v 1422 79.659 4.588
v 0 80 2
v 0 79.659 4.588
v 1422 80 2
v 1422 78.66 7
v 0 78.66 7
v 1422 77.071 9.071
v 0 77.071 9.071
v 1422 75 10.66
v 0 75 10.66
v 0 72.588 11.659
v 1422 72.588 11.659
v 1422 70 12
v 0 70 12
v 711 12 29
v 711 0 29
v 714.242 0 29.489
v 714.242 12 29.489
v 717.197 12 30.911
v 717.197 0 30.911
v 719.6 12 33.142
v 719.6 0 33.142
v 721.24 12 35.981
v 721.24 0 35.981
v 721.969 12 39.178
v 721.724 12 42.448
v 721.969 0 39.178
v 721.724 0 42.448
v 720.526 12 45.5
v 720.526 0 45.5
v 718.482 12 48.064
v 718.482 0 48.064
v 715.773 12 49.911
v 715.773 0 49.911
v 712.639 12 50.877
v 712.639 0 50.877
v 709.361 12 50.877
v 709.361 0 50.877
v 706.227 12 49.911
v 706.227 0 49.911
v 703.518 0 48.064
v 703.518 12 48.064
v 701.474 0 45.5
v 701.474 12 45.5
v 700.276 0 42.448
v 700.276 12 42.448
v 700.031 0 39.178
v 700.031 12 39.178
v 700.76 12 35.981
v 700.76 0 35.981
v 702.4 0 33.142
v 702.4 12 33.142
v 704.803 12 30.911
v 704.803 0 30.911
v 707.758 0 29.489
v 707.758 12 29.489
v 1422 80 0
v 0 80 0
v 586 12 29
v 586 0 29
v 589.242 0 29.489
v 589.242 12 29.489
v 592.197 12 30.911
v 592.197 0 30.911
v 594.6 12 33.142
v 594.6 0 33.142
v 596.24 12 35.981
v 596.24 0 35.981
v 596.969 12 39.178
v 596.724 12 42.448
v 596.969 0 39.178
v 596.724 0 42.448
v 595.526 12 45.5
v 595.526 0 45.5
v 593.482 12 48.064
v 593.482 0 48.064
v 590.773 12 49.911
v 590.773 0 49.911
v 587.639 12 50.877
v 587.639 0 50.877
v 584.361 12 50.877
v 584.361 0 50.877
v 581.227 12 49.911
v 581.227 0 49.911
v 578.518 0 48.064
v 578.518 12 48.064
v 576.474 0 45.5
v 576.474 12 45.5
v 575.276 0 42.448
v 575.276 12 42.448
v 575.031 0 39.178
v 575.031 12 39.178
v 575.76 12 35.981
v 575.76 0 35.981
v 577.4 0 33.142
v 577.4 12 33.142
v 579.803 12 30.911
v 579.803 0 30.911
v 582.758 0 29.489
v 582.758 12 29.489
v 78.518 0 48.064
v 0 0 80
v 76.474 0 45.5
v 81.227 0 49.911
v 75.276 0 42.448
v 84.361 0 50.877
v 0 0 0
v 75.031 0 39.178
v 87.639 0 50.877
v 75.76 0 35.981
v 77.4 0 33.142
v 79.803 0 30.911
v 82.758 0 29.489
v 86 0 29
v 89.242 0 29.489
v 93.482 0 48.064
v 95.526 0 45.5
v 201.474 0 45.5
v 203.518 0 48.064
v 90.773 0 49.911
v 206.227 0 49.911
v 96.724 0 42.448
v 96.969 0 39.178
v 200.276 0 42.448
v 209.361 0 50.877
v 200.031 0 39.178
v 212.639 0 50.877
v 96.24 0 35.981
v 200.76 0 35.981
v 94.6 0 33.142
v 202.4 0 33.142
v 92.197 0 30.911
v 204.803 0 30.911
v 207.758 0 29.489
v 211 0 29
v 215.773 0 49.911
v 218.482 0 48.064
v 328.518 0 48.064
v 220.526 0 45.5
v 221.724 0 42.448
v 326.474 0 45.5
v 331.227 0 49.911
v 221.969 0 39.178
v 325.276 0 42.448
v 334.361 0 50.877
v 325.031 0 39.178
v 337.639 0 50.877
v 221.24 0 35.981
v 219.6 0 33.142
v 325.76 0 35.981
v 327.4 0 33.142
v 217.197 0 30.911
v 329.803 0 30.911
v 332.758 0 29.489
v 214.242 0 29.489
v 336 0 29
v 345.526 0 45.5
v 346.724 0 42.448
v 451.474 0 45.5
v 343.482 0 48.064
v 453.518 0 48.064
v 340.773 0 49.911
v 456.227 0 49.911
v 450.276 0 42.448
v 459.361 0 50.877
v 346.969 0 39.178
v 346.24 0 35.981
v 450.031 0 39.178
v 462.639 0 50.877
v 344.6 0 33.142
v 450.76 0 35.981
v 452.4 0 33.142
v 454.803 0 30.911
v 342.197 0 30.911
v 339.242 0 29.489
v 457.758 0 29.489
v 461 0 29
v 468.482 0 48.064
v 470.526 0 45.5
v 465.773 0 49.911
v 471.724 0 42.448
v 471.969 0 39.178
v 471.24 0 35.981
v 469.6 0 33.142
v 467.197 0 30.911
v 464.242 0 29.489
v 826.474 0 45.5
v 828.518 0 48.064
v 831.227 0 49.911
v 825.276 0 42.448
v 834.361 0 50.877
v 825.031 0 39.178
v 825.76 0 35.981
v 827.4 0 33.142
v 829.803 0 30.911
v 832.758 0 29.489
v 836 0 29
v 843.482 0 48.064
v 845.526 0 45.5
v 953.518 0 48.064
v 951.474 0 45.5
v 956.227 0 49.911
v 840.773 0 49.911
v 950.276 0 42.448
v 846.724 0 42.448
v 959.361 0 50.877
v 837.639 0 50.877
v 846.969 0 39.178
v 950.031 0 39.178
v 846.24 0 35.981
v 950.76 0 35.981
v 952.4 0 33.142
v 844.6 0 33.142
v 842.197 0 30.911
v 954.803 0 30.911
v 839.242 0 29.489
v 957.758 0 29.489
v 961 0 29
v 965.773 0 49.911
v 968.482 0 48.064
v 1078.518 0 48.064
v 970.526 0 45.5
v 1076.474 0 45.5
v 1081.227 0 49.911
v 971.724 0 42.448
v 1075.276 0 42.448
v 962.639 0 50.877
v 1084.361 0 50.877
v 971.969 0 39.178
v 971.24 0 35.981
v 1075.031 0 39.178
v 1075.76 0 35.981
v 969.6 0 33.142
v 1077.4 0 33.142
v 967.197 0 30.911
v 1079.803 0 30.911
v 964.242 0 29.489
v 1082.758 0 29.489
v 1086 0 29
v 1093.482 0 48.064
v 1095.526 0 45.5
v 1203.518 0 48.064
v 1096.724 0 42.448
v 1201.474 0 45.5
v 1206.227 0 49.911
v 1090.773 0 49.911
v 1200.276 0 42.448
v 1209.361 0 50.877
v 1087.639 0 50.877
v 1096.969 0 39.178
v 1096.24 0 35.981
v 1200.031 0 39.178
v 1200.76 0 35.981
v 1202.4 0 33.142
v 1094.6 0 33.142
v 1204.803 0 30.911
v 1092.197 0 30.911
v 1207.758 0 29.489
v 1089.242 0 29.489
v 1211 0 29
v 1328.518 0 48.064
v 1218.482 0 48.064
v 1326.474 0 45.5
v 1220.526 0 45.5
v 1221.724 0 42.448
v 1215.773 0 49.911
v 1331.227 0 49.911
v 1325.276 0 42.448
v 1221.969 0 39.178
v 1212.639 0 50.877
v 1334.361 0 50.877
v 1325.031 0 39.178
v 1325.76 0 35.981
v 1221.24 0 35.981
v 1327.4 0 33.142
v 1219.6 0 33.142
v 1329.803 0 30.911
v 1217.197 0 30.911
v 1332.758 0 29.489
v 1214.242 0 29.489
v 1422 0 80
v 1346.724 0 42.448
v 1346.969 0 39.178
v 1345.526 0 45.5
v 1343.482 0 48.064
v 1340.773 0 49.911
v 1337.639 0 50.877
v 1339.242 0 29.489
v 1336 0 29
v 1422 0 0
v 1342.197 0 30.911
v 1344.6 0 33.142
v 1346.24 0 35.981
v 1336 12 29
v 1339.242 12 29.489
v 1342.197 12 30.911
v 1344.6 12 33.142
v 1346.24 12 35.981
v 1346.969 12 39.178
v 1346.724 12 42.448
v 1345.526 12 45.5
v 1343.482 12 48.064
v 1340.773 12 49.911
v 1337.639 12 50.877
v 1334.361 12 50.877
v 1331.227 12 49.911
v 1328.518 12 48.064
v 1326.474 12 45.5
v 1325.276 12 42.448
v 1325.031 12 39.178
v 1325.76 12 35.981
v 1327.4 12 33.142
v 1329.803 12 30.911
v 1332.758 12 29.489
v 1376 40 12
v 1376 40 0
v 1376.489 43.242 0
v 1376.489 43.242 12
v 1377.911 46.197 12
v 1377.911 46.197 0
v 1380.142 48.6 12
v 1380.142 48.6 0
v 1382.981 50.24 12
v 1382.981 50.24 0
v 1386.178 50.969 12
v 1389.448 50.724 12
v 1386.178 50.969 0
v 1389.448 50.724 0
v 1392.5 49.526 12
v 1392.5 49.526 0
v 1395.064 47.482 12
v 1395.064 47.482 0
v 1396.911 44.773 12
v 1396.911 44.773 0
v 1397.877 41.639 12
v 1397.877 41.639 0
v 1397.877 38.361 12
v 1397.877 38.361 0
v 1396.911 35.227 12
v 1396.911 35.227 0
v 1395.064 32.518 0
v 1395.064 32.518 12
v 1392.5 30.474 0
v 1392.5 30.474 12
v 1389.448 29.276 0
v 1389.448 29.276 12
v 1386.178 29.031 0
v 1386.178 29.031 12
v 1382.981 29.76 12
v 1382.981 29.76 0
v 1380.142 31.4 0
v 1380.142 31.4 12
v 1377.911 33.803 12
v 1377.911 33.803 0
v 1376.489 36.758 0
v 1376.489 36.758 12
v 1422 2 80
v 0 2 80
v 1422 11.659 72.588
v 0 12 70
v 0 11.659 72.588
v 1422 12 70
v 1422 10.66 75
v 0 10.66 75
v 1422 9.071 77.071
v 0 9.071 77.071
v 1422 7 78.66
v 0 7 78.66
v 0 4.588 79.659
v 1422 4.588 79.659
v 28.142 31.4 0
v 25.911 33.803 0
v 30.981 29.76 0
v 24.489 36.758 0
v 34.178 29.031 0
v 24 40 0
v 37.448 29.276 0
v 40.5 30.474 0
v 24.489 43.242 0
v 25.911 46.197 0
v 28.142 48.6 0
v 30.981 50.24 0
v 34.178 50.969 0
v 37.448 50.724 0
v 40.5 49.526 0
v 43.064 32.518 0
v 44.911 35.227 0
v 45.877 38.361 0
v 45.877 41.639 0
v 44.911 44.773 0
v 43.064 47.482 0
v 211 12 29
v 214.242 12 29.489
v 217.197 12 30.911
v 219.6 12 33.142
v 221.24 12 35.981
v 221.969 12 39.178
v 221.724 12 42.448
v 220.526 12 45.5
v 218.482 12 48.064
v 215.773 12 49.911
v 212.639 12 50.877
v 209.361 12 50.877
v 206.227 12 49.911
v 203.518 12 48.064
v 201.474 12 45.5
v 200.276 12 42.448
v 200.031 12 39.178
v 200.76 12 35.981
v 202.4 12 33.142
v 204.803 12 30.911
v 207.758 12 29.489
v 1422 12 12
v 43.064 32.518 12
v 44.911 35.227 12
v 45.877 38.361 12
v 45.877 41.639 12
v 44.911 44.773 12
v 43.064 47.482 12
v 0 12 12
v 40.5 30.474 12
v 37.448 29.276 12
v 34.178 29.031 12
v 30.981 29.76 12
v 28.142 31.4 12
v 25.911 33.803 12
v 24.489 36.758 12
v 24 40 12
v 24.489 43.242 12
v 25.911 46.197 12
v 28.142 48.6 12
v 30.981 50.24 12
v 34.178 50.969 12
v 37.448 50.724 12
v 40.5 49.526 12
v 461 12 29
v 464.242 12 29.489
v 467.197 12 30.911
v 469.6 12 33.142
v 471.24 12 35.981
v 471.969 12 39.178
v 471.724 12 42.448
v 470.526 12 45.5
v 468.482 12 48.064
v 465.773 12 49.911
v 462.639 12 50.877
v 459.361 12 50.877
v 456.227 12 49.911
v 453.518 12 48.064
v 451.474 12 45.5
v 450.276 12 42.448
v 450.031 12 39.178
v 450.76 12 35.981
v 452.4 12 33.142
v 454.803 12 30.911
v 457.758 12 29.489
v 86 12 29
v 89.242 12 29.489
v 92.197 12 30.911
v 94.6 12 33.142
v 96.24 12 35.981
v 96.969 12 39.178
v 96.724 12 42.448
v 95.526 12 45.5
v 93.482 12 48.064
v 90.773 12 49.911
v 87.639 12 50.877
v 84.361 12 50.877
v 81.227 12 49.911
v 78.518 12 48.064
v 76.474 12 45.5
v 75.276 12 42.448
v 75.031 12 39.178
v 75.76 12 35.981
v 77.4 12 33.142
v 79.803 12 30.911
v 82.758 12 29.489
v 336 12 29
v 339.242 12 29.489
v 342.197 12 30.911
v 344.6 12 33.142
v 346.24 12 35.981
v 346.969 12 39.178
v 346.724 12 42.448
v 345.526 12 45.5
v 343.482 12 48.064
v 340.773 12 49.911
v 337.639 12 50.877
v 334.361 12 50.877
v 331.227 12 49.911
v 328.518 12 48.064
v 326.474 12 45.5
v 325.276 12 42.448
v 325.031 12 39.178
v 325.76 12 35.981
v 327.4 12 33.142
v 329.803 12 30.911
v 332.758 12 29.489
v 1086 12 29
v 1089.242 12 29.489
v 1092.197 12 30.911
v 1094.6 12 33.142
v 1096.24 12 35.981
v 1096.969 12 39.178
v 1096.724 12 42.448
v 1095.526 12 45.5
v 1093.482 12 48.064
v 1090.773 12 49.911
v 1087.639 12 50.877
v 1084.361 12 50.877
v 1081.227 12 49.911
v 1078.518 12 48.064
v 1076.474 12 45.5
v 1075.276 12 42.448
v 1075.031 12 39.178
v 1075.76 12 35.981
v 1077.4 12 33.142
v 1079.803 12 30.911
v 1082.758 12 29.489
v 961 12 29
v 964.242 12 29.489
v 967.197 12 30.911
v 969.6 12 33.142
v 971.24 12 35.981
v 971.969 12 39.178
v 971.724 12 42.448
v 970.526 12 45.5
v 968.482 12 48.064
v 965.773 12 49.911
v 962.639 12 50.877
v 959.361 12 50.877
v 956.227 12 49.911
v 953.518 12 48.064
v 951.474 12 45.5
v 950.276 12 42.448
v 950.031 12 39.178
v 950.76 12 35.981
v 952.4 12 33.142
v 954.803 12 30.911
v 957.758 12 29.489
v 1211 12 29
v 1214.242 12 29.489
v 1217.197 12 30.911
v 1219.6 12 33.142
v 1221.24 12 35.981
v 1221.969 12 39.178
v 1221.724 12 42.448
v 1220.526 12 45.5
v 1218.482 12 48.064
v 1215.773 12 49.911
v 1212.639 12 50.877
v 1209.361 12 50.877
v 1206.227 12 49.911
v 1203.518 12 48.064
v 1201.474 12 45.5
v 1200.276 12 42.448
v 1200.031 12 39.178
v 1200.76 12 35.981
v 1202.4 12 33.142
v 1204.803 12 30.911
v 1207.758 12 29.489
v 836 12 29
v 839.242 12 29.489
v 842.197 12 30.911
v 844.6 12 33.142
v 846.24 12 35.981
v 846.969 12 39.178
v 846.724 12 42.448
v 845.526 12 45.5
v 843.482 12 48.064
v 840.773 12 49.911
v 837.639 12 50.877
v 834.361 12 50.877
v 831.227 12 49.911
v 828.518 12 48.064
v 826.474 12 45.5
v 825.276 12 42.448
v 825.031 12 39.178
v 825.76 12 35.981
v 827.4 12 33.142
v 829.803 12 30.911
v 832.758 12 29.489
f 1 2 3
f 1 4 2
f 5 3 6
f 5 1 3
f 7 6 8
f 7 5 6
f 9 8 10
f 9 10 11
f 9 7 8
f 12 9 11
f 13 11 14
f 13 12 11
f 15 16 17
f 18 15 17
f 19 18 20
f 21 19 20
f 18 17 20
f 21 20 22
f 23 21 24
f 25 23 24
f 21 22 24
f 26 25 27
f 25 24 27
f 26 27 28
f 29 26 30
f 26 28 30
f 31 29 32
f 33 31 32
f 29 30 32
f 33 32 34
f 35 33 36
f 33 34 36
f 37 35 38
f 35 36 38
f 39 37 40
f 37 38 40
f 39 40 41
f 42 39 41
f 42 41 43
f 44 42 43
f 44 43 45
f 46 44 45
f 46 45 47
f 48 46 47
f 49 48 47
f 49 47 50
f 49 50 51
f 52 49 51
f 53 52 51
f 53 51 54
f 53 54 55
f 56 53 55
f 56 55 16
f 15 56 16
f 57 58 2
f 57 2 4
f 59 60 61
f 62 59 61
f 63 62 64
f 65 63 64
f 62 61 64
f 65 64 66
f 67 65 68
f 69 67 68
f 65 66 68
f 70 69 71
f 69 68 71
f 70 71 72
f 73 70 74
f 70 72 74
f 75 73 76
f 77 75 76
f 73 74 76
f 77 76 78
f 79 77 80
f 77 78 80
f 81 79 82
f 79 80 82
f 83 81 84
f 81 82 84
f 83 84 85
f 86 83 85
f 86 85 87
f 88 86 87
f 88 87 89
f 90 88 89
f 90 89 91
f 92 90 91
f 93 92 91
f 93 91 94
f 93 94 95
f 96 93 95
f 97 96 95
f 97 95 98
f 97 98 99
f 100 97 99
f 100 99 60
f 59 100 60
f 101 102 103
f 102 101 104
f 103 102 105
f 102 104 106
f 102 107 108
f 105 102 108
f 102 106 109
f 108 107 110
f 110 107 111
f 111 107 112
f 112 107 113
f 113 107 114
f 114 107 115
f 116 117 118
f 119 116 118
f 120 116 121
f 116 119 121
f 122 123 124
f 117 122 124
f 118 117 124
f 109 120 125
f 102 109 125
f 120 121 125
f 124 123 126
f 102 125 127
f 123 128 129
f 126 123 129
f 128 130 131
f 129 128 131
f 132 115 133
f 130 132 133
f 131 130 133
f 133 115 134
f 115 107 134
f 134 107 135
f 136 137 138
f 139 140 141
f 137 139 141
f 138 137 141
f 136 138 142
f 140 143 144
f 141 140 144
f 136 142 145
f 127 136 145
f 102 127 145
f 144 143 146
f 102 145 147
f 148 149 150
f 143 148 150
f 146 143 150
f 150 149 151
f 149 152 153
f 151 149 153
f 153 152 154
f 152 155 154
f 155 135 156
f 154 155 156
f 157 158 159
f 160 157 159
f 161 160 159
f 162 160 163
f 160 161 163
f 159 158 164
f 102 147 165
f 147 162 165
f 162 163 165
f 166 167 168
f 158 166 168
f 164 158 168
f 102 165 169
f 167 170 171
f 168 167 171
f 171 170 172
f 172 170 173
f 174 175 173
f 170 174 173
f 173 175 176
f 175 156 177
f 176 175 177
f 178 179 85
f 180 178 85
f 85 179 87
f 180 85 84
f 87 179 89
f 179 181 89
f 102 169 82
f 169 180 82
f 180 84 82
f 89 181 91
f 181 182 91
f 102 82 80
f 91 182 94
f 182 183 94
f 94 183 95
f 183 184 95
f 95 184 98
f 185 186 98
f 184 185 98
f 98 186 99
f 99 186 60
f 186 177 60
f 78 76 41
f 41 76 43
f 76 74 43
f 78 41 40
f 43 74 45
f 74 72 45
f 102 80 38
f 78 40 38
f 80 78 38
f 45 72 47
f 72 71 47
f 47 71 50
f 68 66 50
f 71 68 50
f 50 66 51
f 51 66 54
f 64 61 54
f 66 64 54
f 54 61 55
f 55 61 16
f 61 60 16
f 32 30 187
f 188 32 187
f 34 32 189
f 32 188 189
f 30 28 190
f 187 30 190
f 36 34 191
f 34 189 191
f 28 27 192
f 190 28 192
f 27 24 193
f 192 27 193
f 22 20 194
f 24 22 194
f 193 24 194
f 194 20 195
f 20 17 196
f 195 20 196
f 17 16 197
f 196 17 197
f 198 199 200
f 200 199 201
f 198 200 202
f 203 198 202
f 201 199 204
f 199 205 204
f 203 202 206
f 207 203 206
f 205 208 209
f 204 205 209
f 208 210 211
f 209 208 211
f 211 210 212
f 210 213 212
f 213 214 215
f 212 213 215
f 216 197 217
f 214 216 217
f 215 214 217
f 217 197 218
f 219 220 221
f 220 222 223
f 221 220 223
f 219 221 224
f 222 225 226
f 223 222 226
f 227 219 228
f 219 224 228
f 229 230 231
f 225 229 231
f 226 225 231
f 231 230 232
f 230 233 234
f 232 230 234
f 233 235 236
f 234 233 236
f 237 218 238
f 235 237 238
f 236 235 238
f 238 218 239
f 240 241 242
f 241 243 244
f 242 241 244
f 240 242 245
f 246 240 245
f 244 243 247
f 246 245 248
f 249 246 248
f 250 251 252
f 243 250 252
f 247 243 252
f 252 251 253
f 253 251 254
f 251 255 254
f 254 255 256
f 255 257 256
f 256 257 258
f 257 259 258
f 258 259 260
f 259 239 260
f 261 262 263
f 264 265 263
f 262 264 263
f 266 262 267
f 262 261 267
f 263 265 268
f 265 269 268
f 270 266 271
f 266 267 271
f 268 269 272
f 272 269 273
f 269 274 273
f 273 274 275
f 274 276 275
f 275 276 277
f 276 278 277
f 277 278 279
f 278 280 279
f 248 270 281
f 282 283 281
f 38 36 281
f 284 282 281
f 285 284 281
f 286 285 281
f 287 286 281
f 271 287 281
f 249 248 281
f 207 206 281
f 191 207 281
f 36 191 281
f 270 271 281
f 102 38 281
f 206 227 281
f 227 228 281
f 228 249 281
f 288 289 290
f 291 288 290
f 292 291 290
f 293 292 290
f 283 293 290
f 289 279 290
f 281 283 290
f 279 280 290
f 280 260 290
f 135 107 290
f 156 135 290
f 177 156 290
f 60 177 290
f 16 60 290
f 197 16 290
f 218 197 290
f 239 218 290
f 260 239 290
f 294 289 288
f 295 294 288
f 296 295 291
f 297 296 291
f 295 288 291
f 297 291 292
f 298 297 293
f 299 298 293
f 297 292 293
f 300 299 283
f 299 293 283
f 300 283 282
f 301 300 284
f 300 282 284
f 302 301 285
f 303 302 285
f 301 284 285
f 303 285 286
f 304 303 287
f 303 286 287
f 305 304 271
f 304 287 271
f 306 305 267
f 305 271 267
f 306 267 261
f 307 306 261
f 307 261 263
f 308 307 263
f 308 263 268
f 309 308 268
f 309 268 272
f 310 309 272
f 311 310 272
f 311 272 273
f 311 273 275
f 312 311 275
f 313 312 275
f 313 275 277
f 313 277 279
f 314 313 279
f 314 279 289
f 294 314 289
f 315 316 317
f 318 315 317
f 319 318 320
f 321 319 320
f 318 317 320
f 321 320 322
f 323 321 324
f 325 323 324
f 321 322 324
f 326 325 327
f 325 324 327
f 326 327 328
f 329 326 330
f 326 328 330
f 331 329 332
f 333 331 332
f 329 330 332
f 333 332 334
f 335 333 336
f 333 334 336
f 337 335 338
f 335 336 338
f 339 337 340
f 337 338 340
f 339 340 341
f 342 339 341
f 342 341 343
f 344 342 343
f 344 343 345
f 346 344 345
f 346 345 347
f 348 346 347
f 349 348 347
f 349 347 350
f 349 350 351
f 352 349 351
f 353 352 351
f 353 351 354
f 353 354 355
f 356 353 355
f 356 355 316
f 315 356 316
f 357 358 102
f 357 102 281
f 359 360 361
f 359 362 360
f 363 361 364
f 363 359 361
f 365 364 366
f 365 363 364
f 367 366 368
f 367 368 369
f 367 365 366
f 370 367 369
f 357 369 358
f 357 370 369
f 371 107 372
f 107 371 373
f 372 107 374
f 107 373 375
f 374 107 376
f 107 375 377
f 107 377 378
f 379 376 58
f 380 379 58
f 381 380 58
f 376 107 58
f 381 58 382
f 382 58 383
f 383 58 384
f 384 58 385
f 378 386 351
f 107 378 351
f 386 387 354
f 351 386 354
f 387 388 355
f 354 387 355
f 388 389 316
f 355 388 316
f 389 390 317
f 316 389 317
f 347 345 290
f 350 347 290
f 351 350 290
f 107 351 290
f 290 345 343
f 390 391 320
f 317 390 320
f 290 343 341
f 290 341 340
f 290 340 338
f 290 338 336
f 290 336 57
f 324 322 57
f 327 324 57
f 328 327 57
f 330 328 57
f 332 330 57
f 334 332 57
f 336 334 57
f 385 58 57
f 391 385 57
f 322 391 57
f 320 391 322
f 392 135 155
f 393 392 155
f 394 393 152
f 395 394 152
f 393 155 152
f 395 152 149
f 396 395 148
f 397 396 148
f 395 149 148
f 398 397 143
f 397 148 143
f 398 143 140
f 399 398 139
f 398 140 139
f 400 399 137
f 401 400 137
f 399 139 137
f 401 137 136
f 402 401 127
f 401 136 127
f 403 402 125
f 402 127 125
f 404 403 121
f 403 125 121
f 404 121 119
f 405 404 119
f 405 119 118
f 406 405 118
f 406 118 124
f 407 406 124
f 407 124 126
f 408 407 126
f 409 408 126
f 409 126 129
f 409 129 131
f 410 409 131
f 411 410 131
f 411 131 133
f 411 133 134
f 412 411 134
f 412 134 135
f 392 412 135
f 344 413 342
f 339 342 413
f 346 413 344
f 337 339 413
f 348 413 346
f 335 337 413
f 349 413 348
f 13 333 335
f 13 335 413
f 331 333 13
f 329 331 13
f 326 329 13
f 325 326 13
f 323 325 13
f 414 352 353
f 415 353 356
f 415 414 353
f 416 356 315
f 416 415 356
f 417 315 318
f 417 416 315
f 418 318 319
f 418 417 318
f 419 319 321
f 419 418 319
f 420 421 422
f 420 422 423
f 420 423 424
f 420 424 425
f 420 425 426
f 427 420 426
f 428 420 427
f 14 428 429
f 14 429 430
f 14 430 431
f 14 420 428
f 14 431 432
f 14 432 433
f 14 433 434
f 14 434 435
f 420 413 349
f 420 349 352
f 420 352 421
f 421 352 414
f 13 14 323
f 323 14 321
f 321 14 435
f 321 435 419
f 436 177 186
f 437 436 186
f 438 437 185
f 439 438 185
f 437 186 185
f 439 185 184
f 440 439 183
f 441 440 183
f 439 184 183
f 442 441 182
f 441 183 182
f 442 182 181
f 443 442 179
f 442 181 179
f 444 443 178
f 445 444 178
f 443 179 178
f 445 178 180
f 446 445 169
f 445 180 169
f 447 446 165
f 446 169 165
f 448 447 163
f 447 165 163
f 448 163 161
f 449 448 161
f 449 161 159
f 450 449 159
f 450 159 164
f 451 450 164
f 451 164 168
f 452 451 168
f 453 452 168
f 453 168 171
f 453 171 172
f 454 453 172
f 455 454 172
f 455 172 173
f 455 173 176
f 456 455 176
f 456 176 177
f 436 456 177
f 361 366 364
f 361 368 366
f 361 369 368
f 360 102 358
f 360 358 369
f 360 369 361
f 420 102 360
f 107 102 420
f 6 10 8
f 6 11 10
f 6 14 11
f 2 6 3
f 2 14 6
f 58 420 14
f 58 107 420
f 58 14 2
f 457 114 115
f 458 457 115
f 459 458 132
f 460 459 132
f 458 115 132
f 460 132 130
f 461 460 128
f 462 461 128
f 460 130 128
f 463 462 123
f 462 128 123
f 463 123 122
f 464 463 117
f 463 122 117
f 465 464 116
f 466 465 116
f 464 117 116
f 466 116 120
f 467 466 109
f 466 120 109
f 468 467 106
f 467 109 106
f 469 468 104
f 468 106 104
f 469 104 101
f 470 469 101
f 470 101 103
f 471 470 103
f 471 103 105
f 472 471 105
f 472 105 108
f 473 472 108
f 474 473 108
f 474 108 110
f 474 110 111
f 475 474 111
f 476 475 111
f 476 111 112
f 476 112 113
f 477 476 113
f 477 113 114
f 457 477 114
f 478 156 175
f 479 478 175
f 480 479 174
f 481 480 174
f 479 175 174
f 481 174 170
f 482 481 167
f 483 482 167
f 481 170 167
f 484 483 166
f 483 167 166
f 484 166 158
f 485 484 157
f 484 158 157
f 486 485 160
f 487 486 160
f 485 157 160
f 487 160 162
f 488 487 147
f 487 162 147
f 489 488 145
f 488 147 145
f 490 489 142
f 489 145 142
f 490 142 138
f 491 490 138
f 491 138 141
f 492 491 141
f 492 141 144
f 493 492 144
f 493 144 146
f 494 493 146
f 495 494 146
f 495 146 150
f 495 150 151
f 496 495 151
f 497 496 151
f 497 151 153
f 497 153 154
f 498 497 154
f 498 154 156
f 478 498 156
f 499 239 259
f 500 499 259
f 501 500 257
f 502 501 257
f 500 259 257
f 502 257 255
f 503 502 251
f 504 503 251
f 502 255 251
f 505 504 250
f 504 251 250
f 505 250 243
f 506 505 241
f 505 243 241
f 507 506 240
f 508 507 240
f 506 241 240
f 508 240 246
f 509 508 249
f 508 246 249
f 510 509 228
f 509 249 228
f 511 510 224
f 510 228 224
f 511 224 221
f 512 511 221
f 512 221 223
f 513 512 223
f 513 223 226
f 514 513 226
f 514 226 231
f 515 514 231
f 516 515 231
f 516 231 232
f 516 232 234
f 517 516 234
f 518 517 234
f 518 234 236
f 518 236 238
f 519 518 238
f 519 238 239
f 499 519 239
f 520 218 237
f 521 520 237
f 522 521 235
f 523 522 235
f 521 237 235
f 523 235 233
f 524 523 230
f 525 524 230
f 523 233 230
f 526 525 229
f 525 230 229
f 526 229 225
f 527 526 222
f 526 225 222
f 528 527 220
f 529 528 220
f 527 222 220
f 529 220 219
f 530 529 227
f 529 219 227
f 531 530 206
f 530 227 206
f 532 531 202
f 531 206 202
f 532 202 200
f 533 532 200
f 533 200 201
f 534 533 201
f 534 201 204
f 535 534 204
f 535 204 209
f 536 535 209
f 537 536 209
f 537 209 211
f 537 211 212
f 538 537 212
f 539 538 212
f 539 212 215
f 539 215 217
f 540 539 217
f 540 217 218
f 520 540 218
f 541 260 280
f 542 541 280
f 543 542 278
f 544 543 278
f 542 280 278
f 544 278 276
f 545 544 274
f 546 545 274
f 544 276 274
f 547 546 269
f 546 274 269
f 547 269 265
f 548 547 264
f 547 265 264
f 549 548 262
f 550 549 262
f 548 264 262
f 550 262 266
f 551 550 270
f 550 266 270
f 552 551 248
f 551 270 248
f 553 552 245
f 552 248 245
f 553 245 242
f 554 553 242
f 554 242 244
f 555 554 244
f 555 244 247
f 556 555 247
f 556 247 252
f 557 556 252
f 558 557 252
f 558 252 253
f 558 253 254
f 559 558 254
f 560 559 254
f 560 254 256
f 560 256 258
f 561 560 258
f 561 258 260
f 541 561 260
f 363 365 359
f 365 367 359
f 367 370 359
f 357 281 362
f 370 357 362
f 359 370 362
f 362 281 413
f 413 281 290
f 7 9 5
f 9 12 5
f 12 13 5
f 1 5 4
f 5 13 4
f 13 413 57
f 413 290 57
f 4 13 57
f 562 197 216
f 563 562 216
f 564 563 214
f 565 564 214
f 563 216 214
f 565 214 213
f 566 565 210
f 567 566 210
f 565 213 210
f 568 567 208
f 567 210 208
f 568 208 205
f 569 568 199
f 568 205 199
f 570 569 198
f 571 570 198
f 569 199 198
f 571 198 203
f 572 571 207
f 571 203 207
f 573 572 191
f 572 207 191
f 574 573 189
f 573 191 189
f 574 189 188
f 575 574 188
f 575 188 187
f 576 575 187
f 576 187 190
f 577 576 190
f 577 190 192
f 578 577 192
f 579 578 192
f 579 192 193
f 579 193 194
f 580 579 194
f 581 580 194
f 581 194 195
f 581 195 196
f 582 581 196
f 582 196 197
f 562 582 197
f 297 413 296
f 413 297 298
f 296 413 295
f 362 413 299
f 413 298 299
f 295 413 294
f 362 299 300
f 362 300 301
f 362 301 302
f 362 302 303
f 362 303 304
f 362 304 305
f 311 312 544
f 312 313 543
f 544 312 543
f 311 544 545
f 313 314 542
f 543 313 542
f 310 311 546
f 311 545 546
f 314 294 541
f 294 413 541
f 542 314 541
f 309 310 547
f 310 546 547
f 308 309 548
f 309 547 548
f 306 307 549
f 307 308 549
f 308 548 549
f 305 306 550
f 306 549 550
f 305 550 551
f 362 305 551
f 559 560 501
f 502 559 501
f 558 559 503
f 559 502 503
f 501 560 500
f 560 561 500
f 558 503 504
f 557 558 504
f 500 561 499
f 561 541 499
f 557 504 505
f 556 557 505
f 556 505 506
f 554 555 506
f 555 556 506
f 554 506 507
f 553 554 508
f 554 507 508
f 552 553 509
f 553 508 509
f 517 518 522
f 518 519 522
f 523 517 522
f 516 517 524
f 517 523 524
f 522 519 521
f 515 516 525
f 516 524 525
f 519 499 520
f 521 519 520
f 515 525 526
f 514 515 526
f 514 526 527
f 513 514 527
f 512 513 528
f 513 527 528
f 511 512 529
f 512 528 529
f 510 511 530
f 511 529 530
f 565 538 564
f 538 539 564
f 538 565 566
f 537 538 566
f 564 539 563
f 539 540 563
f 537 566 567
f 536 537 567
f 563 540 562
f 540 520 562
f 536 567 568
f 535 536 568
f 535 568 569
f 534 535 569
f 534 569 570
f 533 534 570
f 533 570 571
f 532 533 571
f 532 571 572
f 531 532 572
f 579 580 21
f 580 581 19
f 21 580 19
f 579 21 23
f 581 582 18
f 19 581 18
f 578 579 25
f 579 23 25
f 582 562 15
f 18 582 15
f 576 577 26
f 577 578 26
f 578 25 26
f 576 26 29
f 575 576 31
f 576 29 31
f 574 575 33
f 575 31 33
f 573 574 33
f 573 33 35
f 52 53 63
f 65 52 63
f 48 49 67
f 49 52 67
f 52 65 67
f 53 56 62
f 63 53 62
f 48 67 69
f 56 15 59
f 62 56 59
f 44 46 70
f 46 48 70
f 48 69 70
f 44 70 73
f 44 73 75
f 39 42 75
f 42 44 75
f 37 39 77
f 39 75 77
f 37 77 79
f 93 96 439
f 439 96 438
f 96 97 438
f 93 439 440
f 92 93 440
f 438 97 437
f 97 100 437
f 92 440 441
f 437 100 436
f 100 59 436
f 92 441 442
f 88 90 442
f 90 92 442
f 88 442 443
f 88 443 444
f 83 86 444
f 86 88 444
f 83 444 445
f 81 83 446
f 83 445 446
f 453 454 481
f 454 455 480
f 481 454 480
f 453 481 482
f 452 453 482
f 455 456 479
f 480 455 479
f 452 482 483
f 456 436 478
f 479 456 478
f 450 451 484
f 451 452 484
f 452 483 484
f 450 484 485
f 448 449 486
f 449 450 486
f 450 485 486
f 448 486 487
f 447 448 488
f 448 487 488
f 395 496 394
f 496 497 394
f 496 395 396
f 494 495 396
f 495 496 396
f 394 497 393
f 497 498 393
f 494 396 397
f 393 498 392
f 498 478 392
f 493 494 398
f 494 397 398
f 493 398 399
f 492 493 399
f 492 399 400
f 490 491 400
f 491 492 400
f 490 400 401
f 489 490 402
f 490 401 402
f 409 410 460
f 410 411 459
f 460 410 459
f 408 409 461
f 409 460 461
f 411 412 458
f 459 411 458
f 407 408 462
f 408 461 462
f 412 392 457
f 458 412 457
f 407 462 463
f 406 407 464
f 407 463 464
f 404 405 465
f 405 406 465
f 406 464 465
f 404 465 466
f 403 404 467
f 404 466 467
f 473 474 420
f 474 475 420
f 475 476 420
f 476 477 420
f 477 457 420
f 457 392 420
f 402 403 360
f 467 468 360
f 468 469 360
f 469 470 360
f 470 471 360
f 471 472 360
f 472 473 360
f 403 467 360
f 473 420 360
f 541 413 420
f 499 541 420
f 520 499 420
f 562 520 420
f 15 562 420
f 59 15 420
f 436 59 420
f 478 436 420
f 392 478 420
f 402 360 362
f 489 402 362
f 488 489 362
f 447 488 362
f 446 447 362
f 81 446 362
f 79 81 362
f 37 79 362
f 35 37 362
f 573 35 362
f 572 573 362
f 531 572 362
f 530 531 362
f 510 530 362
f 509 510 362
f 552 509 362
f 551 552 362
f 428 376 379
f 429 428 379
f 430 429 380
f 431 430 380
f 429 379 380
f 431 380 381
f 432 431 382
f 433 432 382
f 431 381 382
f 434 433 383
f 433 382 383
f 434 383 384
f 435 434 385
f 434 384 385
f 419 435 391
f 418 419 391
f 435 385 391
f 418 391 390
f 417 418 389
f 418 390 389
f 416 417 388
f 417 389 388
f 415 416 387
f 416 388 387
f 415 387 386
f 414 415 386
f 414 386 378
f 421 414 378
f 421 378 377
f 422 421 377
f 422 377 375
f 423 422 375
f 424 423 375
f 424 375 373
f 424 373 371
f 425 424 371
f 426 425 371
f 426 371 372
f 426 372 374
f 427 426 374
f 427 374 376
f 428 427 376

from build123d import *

# Parameters (mm, degrees)
SKETCH_1_W             = 1422
SKETCH_1_H             = 80
EXTRUDE_1_DEPTH        = 80
SKETCH_3_W             = 68
SKETCH_3_H             = 68
CUT_EXTRUDE_2_DEPTH    = 1427.49360321
FILLET_1_R             = 10
SKETCH_4_R             = 11
CUT_EXTRUDE_3_DEPTH    = 1427.49360321
PATTERN_LINEAR_1_COUNT = 2
PATTERN_LINEAR_1_PITCH = 1352
SKETCH_5_R             = 11
CUT_EXTRUDE_4_DEPTH    = 1427.49360321
PATTERN_LINEAR_2_COUNT = 11
PATTERN_LINEAR_2_PITCH = 125


with BuildPart() as part:
    # 草图1 → 拉伸1 (new body)
    with BuildSketch(Plane.XY):
        with Locations((711, 40)):
            Rectangle(SKETCH_1_W, SKETCH_1_H)
    extrude(amount=EXTRUDE_1_DEPTH)

    # 草图3 → 拉伸2 (cut, through all)
    with BuildSketch(Plane.ZY):
        with Locations((46, 46)):
            Rectangle(SKETCH_3_W, SKETCH_3_H)
    extrude(amount=-CUT_EXTRUDE_2_DEPTH, mode=Mode.SUBTRACT)

    # 圆角1
    fillet_1_edges = [part.edges().sort_by_distance(p)[0] for p in [
        (711, 80, 12),
        (711, 12, 80),
    ]]
    fillet(fillet_1_edges, radius=FILLET_1_R)

    # 草图4 → 拉伸3 (cut, through all)
    with BuildSketch(Plane(origin=(0, 0, 0), x_dir=(-1, 0, 0), z_dir=(0, 0, -1))):
        with Locations((-1387, 40)):
            Circle(SKETCH_4_R)
    cut_extrude_3 = extrude(amount=-CUT_EXTRUDE_3_DEPTH, mode=Mode.SUBTRACT)

    # 阵列(线性)1: 拉伸3 ×2
    with Locations(*[(-i * PATTERN_LINEAR_1_PITCH, 0, 0) for i in range(1, PATTERN_LINEAR_1_COUNT)]):
        add(cut_extrude_3, mode=Mode.SUBTRACT)

    # 草图5 → 拉伸4 (cut, through all)
    with BuildSketch(Plane.XZ):
        with Locations(Location((86, 40, 0), (0, 0, 270))):
            Circle(SKETCH_5_R)
    cut_extrude_4 = extrude(amount=-CUT_EXTRUDE_4_DEPTH, mode=Mode.SUBTRACT)

    # 阵列(线性)2: 拉伸4 ×11
    with Locations(*[(i * PATTERN_LINEAR_2_PITCH, 0, 0) for i in range(1, PATTERN_LINEAR_2_COUNT)]):
        add(cut_extrude_4, mode=Mode.SUBTRACT)


solid = part.part
